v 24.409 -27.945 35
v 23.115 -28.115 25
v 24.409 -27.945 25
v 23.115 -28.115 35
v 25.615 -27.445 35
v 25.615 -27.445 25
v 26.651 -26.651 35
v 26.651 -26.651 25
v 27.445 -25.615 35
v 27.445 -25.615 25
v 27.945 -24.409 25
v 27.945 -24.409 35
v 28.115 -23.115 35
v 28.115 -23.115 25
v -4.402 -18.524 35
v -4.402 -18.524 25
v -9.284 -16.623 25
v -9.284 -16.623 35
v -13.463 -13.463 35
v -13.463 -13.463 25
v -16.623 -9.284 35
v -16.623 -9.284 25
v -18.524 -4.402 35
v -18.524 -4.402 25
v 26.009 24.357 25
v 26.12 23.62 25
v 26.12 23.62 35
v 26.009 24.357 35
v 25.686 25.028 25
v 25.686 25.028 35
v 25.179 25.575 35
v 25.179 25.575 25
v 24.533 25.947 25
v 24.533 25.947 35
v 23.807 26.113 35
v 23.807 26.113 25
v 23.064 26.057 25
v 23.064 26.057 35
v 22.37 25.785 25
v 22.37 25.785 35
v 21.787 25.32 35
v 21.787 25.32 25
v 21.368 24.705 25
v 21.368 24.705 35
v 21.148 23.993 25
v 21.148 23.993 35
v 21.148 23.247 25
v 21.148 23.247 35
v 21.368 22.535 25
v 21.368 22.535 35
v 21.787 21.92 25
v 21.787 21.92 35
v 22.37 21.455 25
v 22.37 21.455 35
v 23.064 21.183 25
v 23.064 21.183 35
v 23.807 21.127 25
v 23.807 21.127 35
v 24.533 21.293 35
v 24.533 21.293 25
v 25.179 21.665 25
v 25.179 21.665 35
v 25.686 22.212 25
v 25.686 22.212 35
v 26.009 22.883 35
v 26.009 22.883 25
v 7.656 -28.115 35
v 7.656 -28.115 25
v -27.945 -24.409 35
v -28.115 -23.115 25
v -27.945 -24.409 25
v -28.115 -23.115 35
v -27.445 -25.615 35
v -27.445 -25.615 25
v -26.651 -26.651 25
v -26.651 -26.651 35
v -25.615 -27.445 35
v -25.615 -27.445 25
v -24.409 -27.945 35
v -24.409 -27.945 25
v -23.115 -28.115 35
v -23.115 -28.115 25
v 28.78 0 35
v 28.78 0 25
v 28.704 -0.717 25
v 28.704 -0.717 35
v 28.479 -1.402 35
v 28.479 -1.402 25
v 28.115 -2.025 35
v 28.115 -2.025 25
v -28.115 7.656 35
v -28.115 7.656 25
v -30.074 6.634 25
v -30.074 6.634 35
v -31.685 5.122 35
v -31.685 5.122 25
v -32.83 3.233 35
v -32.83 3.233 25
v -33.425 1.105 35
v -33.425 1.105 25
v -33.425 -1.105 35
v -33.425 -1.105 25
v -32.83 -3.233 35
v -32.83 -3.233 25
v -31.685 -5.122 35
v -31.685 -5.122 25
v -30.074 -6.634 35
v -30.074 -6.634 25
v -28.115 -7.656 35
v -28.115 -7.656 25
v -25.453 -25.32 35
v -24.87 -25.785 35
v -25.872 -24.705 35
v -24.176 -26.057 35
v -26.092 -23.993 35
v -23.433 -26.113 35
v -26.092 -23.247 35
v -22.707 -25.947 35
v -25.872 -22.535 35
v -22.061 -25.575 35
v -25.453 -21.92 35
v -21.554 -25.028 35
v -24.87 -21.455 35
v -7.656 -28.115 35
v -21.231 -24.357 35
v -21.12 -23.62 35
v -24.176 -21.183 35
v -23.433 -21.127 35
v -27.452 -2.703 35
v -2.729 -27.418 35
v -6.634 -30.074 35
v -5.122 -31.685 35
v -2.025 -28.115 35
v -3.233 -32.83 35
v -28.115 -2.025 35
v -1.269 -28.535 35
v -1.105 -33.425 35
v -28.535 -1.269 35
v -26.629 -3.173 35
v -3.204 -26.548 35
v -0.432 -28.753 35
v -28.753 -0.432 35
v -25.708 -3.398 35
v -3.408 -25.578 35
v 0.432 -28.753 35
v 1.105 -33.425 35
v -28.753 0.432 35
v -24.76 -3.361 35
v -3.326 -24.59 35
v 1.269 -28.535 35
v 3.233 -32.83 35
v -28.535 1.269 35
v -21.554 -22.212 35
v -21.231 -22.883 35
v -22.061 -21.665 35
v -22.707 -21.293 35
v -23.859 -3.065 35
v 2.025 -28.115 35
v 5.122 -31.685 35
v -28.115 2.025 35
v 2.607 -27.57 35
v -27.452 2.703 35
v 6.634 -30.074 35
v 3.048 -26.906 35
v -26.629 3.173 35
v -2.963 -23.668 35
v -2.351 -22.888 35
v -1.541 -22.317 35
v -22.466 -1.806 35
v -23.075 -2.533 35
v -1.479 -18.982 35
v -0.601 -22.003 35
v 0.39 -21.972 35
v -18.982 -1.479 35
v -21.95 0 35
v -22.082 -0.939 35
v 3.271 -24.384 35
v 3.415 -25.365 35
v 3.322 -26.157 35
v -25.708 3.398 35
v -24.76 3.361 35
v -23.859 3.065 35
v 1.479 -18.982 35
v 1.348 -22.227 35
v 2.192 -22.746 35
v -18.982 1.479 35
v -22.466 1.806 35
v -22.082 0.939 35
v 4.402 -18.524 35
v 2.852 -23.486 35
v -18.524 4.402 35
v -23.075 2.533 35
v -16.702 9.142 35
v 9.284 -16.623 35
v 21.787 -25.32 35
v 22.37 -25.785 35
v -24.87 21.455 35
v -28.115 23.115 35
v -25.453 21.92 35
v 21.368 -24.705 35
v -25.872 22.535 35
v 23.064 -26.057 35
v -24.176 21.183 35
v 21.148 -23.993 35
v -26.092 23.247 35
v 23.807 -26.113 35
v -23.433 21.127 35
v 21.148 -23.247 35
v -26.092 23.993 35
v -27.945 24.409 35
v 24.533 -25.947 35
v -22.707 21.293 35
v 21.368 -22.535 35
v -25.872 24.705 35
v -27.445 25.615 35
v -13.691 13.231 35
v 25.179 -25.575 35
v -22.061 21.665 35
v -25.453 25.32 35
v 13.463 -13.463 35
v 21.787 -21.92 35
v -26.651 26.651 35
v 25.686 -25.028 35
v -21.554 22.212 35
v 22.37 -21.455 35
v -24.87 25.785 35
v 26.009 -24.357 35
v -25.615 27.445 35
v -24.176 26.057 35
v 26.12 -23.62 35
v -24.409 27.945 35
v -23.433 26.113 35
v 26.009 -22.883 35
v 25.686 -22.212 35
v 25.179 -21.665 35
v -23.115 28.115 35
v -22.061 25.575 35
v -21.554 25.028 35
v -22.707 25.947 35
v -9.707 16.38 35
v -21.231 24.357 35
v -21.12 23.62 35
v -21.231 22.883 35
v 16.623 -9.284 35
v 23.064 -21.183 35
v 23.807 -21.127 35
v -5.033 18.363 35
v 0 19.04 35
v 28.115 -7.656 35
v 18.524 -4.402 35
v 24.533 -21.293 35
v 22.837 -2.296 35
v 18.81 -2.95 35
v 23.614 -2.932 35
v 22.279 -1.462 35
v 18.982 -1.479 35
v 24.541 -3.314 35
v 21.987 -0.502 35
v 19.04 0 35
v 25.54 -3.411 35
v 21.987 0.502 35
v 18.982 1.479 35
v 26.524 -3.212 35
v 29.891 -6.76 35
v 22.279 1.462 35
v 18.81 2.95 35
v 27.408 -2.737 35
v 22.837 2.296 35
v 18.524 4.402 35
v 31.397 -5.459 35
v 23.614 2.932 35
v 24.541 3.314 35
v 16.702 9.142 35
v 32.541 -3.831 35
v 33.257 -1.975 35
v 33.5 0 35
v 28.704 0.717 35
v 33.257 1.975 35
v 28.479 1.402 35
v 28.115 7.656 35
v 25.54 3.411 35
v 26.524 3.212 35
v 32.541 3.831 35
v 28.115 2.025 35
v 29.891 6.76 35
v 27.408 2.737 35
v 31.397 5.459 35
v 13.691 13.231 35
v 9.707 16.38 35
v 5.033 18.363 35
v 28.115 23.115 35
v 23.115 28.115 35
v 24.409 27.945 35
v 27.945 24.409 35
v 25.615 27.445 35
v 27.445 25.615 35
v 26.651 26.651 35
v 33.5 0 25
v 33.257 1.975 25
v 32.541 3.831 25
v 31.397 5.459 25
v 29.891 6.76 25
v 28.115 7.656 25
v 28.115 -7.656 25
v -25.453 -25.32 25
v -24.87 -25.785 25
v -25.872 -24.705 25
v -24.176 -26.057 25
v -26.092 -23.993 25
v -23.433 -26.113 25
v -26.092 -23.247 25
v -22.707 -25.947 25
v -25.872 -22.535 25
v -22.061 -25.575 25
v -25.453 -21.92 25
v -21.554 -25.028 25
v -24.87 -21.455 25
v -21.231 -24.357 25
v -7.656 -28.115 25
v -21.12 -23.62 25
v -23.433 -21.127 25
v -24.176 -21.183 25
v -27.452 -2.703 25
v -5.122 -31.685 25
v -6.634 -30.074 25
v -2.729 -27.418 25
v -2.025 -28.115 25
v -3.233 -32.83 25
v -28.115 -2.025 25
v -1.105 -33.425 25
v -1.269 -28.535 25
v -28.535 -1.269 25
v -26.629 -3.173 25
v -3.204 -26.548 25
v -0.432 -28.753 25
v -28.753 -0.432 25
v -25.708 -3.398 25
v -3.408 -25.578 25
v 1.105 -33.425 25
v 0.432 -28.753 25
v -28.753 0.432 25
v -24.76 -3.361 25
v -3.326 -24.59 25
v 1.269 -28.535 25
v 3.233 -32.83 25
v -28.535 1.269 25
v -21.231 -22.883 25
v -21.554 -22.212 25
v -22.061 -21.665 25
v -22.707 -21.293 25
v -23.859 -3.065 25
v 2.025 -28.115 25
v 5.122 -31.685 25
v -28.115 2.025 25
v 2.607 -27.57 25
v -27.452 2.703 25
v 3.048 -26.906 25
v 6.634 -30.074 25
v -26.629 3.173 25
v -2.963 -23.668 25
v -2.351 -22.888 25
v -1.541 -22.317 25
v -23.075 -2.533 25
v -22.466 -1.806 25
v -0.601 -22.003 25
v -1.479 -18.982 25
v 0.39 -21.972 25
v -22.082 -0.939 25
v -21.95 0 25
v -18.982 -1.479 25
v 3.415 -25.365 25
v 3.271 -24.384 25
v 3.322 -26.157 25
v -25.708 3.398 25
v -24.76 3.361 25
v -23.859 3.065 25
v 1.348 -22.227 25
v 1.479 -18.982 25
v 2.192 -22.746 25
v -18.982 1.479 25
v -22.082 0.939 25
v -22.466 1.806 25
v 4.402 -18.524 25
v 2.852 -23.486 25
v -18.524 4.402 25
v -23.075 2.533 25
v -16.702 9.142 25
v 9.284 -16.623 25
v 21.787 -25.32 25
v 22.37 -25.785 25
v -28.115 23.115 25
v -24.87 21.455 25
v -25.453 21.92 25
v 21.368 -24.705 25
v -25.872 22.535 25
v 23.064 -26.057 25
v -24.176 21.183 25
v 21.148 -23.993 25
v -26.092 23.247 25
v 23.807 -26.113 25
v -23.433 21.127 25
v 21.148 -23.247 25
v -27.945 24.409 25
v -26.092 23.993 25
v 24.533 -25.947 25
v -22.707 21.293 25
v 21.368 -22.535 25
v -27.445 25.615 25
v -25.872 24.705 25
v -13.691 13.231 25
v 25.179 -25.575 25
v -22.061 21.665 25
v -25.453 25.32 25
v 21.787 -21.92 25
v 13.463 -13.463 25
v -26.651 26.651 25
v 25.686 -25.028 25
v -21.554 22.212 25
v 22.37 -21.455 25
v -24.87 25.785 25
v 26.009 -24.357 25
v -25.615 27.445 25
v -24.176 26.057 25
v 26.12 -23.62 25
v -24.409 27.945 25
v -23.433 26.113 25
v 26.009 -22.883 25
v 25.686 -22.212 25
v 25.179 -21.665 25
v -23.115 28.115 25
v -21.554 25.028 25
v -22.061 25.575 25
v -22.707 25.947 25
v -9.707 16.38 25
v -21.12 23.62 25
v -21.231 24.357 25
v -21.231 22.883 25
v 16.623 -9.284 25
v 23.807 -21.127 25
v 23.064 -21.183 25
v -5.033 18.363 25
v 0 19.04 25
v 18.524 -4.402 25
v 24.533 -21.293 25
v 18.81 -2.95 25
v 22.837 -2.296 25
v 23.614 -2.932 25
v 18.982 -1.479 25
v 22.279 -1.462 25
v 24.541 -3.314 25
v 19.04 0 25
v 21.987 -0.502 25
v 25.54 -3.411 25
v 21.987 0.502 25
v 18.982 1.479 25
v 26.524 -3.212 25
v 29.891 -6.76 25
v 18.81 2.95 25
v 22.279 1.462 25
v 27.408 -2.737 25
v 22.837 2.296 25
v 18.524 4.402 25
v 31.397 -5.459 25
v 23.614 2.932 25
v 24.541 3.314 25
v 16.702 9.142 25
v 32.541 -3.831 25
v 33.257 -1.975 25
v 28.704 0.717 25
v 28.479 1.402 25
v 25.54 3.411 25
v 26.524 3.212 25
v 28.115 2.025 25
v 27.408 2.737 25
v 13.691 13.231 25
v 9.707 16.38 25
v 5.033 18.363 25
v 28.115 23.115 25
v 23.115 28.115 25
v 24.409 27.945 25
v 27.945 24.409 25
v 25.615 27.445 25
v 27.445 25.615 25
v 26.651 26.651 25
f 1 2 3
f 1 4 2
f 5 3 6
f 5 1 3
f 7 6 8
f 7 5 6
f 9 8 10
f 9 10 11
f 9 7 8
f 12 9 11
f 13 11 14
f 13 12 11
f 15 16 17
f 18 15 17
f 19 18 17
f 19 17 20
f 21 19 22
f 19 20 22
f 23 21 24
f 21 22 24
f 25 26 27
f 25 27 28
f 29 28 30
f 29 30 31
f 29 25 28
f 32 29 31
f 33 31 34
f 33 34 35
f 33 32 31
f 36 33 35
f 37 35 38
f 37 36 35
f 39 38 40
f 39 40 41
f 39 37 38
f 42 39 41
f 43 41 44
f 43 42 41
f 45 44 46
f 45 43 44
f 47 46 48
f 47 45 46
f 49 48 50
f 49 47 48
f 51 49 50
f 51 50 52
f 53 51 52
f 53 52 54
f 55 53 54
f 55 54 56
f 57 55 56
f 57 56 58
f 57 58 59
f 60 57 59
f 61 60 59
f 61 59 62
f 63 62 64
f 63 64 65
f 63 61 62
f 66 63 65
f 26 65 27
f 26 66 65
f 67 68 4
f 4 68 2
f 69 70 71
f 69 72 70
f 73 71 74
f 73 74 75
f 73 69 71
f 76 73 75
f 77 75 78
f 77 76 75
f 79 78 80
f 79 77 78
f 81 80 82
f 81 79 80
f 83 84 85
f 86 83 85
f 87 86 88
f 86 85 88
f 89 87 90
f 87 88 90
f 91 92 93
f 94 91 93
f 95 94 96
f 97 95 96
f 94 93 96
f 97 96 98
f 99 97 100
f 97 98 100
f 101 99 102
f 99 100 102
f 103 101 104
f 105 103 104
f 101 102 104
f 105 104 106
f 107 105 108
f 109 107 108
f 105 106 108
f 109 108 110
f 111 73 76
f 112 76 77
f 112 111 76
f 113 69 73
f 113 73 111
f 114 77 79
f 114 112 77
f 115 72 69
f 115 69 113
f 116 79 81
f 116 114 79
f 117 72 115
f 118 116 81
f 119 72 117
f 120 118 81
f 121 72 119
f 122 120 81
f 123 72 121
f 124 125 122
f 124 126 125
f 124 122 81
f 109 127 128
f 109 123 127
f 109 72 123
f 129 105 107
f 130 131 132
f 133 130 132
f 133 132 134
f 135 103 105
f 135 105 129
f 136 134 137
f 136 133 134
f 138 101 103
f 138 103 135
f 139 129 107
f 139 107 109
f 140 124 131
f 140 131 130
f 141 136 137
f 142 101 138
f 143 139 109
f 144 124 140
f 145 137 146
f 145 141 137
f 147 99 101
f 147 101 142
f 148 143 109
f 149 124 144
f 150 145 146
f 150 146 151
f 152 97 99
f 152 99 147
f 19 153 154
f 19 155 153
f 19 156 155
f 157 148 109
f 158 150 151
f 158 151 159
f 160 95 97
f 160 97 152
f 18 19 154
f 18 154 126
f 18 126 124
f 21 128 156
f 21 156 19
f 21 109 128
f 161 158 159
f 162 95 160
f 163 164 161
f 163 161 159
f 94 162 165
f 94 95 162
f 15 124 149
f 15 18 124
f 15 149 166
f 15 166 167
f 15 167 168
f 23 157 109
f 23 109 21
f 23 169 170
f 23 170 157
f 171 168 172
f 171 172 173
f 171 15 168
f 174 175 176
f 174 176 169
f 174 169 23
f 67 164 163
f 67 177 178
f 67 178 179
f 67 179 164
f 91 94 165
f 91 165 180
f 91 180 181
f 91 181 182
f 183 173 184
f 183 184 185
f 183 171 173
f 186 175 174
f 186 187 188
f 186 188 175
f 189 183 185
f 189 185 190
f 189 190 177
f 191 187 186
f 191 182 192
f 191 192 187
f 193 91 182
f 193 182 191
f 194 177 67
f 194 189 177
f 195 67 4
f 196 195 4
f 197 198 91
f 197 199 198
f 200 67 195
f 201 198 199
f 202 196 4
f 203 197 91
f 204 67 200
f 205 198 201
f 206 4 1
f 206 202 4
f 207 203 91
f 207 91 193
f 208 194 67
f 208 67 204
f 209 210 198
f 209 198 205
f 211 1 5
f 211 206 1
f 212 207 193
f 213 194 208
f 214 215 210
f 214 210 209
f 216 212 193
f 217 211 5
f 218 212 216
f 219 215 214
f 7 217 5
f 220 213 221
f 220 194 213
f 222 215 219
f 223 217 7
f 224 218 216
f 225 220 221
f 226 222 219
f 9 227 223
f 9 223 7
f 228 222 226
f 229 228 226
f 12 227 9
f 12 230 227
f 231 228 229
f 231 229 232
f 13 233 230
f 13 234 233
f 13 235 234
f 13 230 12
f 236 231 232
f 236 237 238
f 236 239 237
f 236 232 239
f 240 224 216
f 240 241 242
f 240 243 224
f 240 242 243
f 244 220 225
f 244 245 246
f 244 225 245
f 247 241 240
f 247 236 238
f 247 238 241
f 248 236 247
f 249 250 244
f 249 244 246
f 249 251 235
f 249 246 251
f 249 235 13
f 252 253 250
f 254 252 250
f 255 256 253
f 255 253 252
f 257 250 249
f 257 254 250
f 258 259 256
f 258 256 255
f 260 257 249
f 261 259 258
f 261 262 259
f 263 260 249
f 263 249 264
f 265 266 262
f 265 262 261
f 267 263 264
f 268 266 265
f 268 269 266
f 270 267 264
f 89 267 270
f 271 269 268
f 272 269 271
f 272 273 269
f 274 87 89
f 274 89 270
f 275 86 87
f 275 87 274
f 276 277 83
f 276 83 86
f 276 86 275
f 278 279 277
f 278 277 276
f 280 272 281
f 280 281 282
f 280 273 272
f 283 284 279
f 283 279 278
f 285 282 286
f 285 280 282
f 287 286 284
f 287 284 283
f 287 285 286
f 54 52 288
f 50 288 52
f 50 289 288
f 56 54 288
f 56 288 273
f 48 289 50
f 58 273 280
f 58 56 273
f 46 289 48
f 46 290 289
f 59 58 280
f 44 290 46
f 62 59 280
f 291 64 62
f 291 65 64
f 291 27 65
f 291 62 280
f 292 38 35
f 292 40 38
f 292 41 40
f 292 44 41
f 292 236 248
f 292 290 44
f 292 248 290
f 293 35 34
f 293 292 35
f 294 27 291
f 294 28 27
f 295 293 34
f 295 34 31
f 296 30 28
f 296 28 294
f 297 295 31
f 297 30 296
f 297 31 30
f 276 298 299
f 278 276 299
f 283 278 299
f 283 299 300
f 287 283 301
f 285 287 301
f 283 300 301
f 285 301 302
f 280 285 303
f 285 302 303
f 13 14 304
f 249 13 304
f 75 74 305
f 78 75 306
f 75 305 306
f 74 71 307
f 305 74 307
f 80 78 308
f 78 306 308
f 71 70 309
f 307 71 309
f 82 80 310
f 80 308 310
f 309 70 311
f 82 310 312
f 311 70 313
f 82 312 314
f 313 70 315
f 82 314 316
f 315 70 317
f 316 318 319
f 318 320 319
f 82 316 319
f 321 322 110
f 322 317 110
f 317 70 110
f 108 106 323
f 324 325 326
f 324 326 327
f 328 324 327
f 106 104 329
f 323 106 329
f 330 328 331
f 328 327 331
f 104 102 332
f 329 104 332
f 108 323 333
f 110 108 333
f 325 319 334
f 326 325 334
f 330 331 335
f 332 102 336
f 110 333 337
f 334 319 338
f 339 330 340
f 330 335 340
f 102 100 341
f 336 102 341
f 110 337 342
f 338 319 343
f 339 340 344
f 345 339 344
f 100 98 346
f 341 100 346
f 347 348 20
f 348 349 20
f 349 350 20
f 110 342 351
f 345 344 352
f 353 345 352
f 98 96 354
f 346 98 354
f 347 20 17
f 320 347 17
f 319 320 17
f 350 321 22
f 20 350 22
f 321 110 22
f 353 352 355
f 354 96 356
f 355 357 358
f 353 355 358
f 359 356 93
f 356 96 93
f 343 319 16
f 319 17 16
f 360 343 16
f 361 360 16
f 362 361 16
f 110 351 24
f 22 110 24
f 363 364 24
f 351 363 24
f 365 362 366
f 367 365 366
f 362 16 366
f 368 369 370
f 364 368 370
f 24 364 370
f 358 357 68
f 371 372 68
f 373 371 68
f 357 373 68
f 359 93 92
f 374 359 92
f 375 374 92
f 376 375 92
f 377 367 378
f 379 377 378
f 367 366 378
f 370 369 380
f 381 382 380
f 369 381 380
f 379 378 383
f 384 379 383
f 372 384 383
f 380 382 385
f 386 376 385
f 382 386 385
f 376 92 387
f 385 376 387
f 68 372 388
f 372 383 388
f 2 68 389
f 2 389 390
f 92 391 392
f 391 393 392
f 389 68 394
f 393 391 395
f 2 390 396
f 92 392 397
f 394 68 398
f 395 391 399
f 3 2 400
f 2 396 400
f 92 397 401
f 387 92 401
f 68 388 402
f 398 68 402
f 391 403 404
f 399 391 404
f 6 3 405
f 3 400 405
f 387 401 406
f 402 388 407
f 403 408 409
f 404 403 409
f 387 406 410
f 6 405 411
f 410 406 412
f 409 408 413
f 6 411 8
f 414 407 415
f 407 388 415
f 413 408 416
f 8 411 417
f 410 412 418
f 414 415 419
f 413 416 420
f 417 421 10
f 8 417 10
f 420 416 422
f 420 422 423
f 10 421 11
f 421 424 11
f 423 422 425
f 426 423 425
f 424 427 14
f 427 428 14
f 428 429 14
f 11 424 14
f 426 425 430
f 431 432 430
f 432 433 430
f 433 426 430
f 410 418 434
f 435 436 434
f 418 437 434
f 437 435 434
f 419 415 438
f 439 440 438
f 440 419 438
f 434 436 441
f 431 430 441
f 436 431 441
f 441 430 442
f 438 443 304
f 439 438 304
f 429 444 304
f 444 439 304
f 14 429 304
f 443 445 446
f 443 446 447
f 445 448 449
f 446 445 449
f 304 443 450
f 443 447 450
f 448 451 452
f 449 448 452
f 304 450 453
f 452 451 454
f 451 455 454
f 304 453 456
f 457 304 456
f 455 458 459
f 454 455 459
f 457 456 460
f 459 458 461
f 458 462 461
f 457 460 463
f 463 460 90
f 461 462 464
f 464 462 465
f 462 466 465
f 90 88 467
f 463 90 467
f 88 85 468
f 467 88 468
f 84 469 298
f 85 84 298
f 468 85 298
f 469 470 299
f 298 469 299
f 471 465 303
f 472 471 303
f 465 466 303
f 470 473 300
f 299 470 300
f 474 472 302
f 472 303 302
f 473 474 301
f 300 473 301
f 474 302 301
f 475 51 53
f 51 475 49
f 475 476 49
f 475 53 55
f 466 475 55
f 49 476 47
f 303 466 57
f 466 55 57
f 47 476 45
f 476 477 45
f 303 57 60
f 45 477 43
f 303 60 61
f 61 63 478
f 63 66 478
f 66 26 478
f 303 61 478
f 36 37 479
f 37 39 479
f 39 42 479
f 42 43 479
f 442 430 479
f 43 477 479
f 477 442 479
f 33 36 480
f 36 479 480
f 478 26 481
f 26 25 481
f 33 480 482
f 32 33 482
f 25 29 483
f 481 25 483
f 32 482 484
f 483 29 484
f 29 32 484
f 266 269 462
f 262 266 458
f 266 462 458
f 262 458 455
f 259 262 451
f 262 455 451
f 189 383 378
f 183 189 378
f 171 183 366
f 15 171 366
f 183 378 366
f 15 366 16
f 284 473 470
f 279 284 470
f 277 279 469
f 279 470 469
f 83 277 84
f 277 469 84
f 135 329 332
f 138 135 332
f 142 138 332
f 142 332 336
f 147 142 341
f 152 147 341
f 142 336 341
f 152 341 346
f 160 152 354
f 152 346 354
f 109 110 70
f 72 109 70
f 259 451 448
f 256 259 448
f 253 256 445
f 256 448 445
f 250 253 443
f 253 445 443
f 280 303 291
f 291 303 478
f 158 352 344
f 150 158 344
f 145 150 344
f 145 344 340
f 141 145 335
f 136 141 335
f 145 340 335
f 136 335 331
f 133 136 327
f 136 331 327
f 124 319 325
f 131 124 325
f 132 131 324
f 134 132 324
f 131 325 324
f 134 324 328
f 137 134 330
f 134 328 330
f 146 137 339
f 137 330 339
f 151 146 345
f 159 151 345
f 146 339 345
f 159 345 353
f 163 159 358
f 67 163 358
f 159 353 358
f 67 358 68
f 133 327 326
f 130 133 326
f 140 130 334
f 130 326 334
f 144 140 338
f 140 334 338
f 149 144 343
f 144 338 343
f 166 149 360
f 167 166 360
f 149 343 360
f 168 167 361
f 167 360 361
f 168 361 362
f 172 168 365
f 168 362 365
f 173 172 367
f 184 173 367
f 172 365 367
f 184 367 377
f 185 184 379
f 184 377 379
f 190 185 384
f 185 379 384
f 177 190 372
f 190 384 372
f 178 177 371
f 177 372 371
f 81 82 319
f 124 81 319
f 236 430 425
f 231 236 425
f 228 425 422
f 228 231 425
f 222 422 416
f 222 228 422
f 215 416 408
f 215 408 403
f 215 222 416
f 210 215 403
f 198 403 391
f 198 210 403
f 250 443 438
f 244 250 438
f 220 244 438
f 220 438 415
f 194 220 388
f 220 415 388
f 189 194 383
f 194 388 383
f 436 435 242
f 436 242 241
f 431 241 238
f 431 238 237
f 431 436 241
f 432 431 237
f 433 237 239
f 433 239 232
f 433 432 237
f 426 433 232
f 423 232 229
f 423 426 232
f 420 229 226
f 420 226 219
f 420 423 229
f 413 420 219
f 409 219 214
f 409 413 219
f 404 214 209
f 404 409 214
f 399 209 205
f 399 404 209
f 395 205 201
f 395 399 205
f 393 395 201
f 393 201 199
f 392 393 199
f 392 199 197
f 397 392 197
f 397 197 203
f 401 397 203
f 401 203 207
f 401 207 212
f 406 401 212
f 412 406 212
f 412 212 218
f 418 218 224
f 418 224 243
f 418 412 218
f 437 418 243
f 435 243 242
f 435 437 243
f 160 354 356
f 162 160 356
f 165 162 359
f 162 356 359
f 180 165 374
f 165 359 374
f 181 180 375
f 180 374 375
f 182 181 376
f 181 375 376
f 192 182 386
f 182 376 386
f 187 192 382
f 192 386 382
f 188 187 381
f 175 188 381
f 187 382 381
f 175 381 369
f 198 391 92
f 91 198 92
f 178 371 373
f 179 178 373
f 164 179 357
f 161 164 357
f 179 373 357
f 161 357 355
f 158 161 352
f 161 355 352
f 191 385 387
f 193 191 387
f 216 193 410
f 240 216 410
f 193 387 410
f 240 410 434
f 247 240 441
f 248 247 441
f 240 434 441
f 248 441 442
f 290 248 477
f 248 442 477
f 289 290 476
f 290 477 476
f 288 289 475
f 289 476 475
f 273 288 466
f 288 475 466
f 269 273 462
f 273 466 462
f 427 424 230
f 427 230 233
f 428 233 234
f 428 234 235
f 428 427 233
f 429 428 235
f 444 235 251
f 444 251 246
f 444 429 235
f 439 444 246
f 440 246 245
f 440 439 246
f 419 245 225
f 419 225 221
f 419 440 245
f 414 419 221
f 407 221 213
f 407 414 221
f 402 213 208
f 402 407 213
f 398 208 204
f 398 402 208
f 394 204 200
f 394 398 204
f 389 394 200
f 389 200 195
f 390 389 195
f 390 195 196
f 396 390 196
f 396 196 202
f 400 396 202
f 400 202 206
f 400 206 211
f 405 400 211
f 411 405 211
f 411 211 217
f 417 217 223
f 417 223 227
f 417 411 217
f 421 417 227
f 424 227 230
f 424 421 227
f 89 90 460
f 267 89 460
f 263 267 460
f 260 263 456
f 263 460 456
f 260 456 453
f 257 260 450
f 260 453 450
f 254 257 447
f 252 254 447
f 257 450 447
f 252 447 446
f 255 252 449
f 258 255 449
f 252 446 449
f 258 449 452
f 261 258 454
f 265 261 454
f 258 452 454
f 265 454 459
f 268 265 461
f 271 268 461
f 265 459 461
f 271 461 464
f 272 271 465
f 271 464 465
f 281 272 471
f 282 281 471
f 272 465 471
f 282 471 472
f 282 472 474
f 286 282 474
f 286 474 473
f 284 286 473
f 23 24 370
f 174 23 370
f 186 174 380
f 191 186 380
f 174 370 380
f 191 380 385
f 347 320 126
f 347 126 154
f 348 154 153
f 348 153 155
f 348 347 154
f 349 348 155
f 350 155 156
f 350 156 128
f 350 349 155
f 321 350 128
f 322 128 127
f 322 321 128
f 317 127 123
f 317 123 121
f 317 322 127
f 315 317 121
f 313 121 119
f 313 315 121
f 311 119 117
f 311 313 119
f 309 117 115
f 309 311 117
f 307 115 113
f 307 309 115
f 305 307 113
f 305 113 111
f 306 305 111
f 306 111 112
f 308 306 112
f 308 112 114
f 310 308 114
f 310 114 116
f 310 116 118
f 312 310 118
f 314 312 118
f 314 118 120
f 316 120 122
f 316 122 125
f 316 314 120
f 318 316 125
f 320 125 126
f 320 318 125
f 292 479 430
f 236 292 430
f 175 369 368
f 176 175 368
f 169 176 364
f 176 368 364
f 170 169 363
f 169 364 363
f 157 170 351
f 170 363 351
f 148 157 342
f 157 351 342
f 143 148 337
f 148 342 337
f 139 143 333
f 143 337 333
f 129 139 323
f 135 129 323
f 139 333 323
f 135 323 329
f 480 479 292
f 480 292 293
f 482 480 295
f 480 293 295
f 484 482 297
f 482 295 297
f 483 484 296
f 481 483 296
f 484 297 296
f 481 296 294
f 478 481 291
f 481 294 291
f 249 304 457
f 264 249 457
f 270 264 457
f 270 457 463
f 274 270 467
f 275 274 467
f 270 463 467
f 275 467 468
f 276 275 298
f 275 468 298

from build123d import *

# Parameters (mm, degrees)
F1_START = 25
F0_R     = 2.5
F1_DEPTH = 10
F2_R     = 5


with BuildPart() as f1:
    # F0 (on Top) → F1 (new body)
    with BuildSketch(Plane.XY.offset(F1_START)):
        with BuildLine():
            Line((28.115, 28.115), (-28.115, 28.115))
            Line((-28.115, 28.115), (-28.115, 7.6560907126))
            ThreePointArc((-28.115, 7.6560907126), (-22.7514332101, 7.7037324483), (-18.5240804258, 4.4022771811))
            ThreePointArc((-18.5240804258, 4.4022771811), (0, 19.04), (18.5240804258, 4.4022771811))
            ThreePointArc((18.5240804258, 4.4022771811), (22.7514332101, 7.7037324483), (28.115, 7.6560907126))
            Line((28.115, 7.6560907126), (28.115, 28.115))
        make_face()
        with Locations((-23.62, 23.62)):
            Circle(F0_R, mode=Mode.SUBTRACT)
        with Locations((23.62, 23.62)):
            Circle(F0_R, mode=Mode.SUBTRACT)
        with BuildLine():
            Line((-28.115, 2.0247777656), (-28.115, 7.6560907126))
            ThreePointArc((-28.115, 7.6560907126), (-33.5, 0), (-28.115, -7.6560907126))
            Line((-28.115, -7.6560907126), (-28.115, -2.0247777656))
            ThreePointArc((-28.115, -2.0247777656), (-28.78, 0), (-28.115, 2.0247777656))
        make_face()
        with BuildLine():
            ThreePointArc((-18.5240804258, 4.4022771811), (-22.7514332101, 7.7037324483), (-28.115, 7.6560907126))
            Line((-28.115, 7.6560907126), (-28.115, 2.0247777656))
            ThreePointArc((-28.115, 2.0247777656), (-24.2994074418, 3.2444934119), (-21.95, 0))
            ThreePointArc((-21.95, 0), (-24.2994074418, -3.2444934119), (-28.115, -2.0247777656))
            Line((-28.115, -2.0247777656), (-28.115, -7.6560907126))
            ThreePointArc((-28.115, -7.6560907126), (-22.7514332101, -7.7037324483), (-18.5240804258, -4.4022771811))
            ThreePointArc((-18.5240804258, -4.4022771811), (-19.04, 0), (-18.5240804258, 4.4022771811))
        make_face()
        with BuildLine():
            ThreePointArc((-18.5240804258, -4.4022771811), (-22.7514332101, -7.7037324483), (-28.115, -7.6560907126))
            Line((-28.115, -7.6560907126), (-28.115, -28.115))
            Line((-28.115, -28.115), (-7.6560907126, -28.115))
            ThreePointArc((-7.6560907126, -28.115), (-7.7037324483, -22.7514332101), (-4.4022771811, -18.5240804258))
            ThreePointArc((-4.4022771811, -18.5240804258), (-13.4633131138, -13.4633131138), (-18.5240804258, -4.4022771811))
        make_face()
        with Locations((-23.62, -23.62)):
            Circle(F0_R, mode=Mode.SUBTRACT)
        with BuildLine():
            Line((28.115, 2.0247777656), (28.115, 7.6560907126))
            ThreePointArc((28.115, 7.6560907126), (22.7514332101, 7.7037324483), (18.5240804258, 4.4022771811))
            ThreePointArc((18.5240804258, 4.4022771811), (18.9105802569, 2.2162026862), (19.04, 0))
            ThreePointArc((19.04, 0), (18.9105802569, -2.2162026862), (18.5240804258, -4.4022771811))
            ThreePointArc((18.5240804258, -4.4022771811), (22.7514332101, -7.7037324483), (28.115, -7.6560907126))
            Line((28.115, -7.6560907126), (28.115, -2.0247777656))
            ThreePointArc((28.115, -2.0247777656), (21.95, 0), (28.115, 2.0247777656))
        make_face()
        with BuildLine():
            ThreePointArc((33.5, 0), (32.0189264724, 4.6801161845), (28.115, 7.6560907126))
            Line((28.115, 7.6560907126), (28.115, 2.0247777656))
            ThreePointArc((28.115, 2.0247777656), (28.6094934119, 1.0655925582), (28.78, 0))
            ThreePointArc((28.78, 0), (28.6094934119, -1.0655925582), (28.115, -2.0247777656))
            Line((28.115, -2.0247777656), (28.115, -7.6560907126))
            ThreePointArc((28.115, -7.6560907126), (32.0189264724, -4.6801161845), (33.5, 0))
        make_face()
        with BuildLine():
            Line((28.115, -28.115), (28.115, -7.6560907126))
            ThreePointArc((28.115, -7.6560907126), (22.7514332101, -7.7037324483), (18.5240804258, -4.4022771811))
            ThreePointArc((18.5240804258, -4.4022771811), (13.4633131138, -13.4633131138), (4.4022771811, -18.5240804258))
            ThreePointArc((4.4022771811, -18.5240804258), (7.1411046018, -21.4684823155), (8.135, -25.365))
            ThreePointArc((8.135, -25.365), (8.0143784209, -26.7606946394), (7.6560907126, -28.115))
            Line((7.6560907126, -28.115), (28.115, -28.115))
        make_face()
        with Locations((23.62, -23.62)):
            Circle(F0_R, mode=Mode.SUBTRACT)
        with BuildLine():
            ThreePointArc((4.4022771811, -18.5240804258), (0, -19.04), (-4.4022771811, -18.5240804258))
            ThreePointArc((-4.4022771811, -18.5240804258), (-7.7037324483, -22.7514332101), (-7.6560907126, -28.115))
            Line((-7.6560907126, -28.115), (-2.0247777656, -28.115))
            ThreePointArc((-2.0247777656, -28.115), (-1.5407155692, -22.3173089831), (3.415, -25.365))
            ThreePointArc((3.415, -25.365), (3.0476910169, -26.9057155692), (2.0247777656, -28.115))
            Line((2.0247777656, -28.115), (7.6560907126, -28.115))
            ThreePointArc((7.6560907126, -28.115), (8.0143784209, -26.7606946394), (8.135, -25.365))
            ThreePointArc((8.135, -25.365), (7.1411046018, -21.4684823155), (4.4022771811, -18.5240804258))
        make_face()
        with BuildLine():
            Line((-2.0247777656, -28.115), (-7.6560907126, -28.115))
            ThreePointArc((-7.6560907126, -28.115), (0, -33.5), (7.6560907126, -28.115))
            Line((7.6560907126, -28.115), (2.0247777656, -28.115))
            ThreePointArc((2.0247777656, -28.115), (0, -28.78), (-2.0247777656, -28.115))
        make_face()
    extrude(amount=F1_DEPTH)

    # F2
    f2_edges = [f1.edges().sort_by_distance(p)[0] for p in [
        (-28.115, -28.115, 30),
        (28.115, -28.115, 30),
        (28.115, 28.115, 30),
        (-28.115, 28.115, 30),
    ]]
    fillet(f2_edges, radius=F2_R)


solid = f1.part
